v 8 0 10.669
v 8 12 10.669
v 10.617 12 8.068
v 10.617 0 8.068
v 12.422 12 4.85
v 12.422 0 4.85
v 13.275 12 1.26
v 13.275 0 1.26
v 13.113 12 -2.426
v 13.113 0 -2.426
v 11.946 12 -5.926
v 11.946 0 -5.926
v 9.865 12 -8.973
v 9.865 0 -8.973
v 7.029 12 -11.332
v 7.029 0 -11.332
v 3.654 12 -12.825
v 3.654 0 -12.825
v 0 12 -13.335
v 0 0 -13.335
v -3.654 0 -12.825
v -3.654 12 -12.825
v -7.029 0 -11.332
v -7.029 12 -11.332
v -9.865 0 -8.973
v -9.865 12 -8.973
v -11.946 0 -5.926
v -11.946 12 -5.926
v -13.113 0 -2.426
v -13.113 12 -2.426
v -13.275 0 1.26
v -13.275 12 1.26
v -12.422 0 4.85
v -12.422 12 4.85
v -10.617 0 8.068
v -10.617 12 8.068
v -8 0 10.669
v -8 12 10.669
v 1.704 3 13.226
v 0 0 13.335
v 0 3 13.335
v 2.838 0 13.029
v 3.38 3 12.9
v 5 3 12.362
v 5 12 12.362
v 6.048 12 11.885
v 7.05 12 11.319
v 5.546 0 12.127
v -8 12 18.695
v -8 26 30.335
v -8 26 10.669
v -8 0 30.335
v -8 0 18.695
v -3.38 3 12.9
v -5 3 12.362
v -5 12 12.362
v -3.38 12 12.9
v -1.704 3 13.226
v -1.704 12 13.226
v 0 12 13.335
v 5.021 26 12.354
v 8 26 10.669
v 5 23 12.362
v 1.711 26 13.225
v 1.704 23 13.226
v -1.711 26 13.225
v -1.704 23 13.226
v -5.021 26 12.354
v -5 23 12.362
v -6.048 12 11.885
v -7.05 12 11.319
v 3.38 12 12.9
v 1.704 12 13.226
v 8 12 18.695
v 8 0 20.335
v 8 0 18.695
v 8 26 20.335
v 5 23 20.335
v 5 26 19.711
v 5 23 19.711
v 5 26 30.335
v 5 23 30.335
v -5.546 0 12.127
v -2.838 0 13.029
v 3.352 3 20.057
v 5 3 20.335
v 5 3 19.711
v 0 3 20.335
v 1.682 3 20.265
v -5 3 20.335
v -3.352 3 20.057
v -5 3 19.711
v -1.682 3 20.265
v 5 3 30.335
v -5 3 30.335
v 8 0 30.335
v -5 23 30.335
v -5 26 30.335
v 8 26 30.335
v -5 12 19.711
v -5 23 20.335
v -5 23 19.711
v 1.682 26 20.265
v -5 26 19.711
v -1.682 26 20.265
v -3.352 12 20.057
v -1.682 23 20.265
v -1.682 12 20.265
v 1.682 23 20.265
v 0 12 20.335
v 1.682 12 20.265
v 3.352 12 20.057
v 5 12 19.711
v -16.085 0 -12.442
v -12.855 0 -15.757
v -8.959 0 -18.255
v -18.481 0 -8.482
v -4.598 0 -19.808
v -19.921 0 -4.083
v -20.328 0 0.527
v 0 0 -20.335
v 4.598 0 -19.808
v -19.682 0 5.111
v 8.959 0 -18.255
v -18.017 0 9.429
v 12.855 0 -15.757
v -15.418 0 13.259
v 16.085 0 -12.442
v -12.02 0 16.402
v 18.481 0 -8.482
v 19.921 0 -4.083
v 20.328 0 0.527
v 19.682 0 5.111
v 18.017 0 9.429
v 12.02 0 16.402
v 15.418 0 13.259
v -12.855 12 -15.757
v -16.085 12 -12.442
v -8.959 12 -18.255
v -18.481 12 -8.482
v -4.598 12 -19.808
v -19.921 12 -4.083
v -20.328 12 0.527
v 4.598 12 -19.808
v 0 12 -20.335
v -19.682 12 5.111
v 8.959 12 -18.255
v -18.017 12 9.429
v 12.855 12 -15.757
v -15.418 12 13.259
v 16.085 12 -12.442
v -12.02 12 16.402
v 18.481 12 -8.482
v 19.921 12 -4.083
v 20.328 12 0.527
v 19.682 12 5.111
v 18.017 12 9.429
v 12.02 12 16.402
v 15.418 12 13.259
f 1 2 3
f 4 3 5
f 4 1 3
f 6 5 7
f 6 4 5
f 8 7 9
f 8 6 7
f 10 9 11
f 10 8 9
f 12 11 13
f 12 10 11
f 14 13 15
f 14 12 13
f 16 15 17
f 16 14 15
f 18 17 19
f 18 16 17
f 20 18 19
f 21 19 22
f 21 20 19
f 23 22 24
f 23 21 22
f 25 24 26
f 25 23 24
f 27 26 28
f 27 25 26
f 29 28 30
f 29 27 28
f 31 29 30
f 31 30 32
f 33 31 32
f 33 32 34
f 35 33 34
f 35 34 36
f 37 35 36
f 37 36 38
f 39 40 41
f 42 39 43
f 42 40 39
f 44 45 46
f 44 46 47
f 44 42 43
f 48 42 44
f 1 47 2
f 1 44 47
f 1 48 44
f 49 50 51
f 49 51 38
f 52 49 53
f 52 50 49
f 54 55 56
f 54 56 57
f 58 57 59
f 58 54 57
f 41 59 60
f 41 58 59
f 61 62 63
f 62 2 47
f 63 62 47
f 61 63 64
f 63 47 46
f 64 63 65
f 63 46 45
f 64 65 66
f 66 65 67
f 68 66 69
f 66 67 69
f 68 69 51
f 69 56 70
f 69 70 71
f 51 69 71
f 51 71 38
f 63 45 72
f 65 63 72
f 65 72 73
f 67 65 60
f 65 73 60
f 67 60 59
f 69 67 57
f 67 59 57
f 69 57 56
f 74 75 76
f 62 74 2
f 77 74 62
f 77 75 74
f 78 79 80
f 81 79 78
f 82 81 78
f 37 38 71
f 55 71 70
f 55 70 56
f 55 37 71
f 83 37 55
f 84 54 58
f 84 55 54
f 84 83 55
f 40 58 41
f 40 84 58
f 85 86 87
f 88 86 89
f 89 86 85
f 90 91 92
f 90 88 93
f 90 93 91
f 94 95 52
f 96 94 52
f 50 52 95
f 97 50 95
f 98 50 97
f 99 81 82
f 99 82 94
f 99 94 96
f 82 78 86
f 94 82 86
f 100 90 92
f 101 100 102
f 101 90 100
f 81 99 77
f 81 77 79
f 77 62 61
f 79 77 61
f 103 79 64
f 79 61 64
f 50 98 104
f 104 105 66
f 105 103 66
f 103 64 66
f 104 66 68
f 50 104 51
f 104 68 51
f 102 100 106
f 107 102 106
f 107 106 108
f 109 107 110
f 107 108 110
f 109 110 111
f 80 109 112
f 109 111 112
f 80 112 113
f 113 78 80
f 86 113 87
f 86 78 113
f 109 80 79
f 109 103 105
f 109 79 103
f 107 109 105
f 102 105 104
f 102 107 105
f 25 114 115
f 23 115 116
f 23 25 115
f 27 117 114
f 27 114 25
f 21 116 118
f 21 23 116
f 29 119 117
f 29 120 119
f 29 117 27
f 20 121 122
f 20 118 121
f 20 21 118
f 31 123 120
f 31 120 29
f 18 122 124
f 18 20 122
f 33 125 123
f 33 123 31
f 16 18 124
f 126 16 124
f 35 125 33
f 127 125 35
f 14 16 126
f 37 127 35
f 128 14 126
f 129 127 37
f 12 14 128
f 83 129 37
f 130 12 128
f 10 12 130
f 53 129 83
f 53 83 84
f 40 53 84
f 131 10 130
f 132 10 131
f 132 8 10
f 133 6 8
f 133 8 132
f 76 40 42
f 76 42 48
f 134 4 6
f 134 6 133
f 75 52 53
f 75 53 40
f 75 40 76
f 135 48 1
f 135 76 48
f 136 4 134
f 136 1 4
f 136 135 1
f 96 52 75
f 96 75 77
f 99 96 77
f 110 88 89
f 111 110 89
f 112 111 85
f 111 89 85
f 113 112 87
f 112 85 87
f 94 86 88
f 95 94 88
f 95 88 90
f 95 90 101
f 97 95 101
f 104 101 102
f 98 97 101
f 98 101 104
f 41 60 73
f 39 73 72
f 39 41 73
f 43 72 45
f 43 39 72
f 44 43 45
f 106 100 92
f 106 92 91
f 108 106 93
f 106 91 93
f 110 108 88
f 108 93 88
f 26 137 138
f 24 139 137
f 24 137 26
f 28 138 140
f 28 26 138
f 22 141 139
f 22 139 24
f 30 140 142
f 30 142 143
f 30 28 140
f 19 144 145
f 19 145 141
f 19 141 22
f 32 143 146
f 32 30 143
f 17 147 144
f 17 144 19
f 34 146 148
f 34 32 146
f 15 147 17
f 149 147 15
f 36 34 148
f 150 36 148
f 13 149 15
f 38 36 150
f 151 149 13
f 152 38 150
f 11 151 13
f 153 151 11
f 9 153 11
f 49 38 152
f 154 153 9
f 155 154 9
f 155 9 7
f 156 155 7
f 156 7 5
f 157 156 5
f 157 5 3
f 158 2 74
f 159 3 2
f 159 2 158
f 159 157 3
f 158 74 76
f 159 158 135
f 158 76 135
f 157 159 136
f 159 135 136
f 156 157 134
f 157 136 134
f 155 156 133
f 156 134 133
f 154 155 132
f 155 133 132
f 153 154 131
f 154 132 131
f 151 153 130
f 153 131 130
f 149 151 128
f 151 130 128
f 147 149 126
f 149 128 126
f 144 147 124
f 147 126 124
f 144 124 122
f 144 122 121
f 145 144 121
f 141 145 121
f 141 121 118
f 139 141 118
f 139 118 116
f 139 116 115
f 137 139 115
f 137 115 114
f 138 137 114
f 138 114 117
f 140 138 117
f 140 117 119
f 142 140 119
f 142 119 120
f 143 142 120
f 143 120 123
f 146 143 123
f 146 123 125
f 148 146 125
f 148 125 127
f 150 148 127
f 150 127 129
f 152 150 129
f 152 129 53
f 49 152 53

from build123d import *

# Parameters (mm, degrees)
SKETCH1_R                            = 20.334999999999997
SKETCH1_R_2                          = 13.334999999999999
BOSS_EXTRUDE1_DEPTH                  = 12
BOSS_EXTRUDE2_DEPTH                  = 10
BOSS_EXTRUDE2_DIRECTION_2_REACH      = 49.027
BOSS_EXTRUDE2_DIRECTION_2_END_RADIUS = 13.334999999999999
CUT_EXTRUDE1_REACH                   = 62.473
CUT_EXTRUDE1_END_RADIUS              = 20.334999999999997
BOSS_EXTRUDE3_DEPTH                  = 11


with BuildPart() as part:
    # Sketch1 → Boss-Extrude1 (new body)
    with BuildSketch(Plane(origin=(0, 0, 0), x_dir=(1, 0, 0), z_dir=(0, 1, 0))):
        with Locations(Location((0, 0, 0), (0, 0, 270))):
            Circle(SKETCH1_R)
        with Locations(Location((0, 0, 0), (0, 0, 270))):
            Circle(SKETCH1_R_2, mode=Mode.SUBTRACT)
    extrude(amount=BOSS_EXTRUDE1_DEPTH)

    # Sketch2 → Boss-Extrude2 (add)
    with BuildSketch(Plane.XY.offset(20.334999999999997)):
        Polygon((-8, 26.000000000000004), (-7.9999999999999964, 0), (8.000000000000004, 0), (8, 26.000000000000004), align=None)
        Polygon((-5.000000000000001, 23.000000000000004), (5, 23.000000000000004), (4.999999999999998, 3), (-4.999999999999998, 3), align=None, mode=Mode.SUBTRACT)
    extrude(amount=BOSS_EXTRUDE2_DEPTH)

    # Boss-Extrude2 direction 2: up to this cylinder (the profile starts outside it)
    boss_extrude2_direction_2_end = Plane(origin=(0, 13, 0), z_dir=(0, -1, 0)) * Cylinder(BOSS_EXTRUDE2_DIRECTION_2_END_RADIUS, 125.724, mode=Mode.PRIVATE)
    # Sketch2 → Boss-Extrude2 direction 2 (add, up to the surface)
    with BuildSketch(Plane.XY.offset(20.334999999999997), mode=Mode.PRIVATE) as boss_extrude2_direction_2_sk1:
        Polygon((-8, 26.000000000000004), (-7.9999999999999964, 0), (8.000000000000004, 0), (8, 26.000000000000004), align=None)
        Polygon((-5.000000000000001, 23.000000000000004), (5, 23.000000000000004), (4.999999999999998, 3), (-4.999999999999998, 3), align=None, mode=Mode.SUBTRACT)
    boss_extrude2_direction_2_tool1 = extrude(boss_extrude2_direction_2_sk1.sketch, amount=-BOSS_EXTRUDE2_DIRECTION_2_REACH, mode=Mode.PRIVATE) - boss_extrude2_direction_2_end
    add(boss_extrude2_direction_2_tool1.solids().sort_by_distance((-7.694713, 13, 20.335))[0])

    # Cut-Extrude1: up to this cylinder (the profile starts outside it)
    cut_extrude1_end = Plane(origin=(0, 24.5, 0), z_dir=(0, -1, 0)) * Cylinder(CUT_EXTRUDE1_END_RADIUS, 166.61599999999999, mode=Mode.PRIVATE)
    # Sketch3 → Cut-Extrude1 (cut, up to the surface)
    with BuildSketch(Plane.XY.offset(30.335), mode=Mode.PRIVATE) as cut_extrude1_sk1:
        Polygon((-5.000000000000002, 26.000000000000004), (4.999999999999997, 26.000000000000004), (4.999999999999997, 23.000000000000004), (-5.000000000000001, 23.000000000000004), align=None)
    cut_extrude1_tool1 = extrude(cut_extrude1_sk1.sketch, amount=-CUT_EXTRUDE1_REACH, mode=Mode.PRIVATE) - cut_extrude1_end
    add(cut_extrude1_tool1.solids().sort_by_distance((0, 24.5, 30.335))[0], mode=Mode.SUBTRACT)

    # Sketch4 → Boss-Extrude3 (add)
    with BuildSketch(Plane(origin=(0, 12, 0), x_dir=(1, 0, 0), z_dir=(0, 1, 0))):
        with BuildLine():
            Line((4.999999999999998, -19.710713457406865), (4.9999999999999964, -12.362128659741414))
            ThreePointArc((4.9999999999999964, -12.362128659741414), (-2.14e-15, -13.335), (-5.000000000000001, -12.362128659741412))
            Line((-5.000000000000001, -12.362128659741412), (-5.000000000000008, -19.710713457406865))
            ThreePointArc((-5.000000000000008, -19.710713457406865), (-7.79e-15, -20.335000000000004), (4.999999999999998, -19.710713457406865))
        make_face()
    extrude(amount=BOSS_EXTRUDE3_DEPTH)


solid = part.part
